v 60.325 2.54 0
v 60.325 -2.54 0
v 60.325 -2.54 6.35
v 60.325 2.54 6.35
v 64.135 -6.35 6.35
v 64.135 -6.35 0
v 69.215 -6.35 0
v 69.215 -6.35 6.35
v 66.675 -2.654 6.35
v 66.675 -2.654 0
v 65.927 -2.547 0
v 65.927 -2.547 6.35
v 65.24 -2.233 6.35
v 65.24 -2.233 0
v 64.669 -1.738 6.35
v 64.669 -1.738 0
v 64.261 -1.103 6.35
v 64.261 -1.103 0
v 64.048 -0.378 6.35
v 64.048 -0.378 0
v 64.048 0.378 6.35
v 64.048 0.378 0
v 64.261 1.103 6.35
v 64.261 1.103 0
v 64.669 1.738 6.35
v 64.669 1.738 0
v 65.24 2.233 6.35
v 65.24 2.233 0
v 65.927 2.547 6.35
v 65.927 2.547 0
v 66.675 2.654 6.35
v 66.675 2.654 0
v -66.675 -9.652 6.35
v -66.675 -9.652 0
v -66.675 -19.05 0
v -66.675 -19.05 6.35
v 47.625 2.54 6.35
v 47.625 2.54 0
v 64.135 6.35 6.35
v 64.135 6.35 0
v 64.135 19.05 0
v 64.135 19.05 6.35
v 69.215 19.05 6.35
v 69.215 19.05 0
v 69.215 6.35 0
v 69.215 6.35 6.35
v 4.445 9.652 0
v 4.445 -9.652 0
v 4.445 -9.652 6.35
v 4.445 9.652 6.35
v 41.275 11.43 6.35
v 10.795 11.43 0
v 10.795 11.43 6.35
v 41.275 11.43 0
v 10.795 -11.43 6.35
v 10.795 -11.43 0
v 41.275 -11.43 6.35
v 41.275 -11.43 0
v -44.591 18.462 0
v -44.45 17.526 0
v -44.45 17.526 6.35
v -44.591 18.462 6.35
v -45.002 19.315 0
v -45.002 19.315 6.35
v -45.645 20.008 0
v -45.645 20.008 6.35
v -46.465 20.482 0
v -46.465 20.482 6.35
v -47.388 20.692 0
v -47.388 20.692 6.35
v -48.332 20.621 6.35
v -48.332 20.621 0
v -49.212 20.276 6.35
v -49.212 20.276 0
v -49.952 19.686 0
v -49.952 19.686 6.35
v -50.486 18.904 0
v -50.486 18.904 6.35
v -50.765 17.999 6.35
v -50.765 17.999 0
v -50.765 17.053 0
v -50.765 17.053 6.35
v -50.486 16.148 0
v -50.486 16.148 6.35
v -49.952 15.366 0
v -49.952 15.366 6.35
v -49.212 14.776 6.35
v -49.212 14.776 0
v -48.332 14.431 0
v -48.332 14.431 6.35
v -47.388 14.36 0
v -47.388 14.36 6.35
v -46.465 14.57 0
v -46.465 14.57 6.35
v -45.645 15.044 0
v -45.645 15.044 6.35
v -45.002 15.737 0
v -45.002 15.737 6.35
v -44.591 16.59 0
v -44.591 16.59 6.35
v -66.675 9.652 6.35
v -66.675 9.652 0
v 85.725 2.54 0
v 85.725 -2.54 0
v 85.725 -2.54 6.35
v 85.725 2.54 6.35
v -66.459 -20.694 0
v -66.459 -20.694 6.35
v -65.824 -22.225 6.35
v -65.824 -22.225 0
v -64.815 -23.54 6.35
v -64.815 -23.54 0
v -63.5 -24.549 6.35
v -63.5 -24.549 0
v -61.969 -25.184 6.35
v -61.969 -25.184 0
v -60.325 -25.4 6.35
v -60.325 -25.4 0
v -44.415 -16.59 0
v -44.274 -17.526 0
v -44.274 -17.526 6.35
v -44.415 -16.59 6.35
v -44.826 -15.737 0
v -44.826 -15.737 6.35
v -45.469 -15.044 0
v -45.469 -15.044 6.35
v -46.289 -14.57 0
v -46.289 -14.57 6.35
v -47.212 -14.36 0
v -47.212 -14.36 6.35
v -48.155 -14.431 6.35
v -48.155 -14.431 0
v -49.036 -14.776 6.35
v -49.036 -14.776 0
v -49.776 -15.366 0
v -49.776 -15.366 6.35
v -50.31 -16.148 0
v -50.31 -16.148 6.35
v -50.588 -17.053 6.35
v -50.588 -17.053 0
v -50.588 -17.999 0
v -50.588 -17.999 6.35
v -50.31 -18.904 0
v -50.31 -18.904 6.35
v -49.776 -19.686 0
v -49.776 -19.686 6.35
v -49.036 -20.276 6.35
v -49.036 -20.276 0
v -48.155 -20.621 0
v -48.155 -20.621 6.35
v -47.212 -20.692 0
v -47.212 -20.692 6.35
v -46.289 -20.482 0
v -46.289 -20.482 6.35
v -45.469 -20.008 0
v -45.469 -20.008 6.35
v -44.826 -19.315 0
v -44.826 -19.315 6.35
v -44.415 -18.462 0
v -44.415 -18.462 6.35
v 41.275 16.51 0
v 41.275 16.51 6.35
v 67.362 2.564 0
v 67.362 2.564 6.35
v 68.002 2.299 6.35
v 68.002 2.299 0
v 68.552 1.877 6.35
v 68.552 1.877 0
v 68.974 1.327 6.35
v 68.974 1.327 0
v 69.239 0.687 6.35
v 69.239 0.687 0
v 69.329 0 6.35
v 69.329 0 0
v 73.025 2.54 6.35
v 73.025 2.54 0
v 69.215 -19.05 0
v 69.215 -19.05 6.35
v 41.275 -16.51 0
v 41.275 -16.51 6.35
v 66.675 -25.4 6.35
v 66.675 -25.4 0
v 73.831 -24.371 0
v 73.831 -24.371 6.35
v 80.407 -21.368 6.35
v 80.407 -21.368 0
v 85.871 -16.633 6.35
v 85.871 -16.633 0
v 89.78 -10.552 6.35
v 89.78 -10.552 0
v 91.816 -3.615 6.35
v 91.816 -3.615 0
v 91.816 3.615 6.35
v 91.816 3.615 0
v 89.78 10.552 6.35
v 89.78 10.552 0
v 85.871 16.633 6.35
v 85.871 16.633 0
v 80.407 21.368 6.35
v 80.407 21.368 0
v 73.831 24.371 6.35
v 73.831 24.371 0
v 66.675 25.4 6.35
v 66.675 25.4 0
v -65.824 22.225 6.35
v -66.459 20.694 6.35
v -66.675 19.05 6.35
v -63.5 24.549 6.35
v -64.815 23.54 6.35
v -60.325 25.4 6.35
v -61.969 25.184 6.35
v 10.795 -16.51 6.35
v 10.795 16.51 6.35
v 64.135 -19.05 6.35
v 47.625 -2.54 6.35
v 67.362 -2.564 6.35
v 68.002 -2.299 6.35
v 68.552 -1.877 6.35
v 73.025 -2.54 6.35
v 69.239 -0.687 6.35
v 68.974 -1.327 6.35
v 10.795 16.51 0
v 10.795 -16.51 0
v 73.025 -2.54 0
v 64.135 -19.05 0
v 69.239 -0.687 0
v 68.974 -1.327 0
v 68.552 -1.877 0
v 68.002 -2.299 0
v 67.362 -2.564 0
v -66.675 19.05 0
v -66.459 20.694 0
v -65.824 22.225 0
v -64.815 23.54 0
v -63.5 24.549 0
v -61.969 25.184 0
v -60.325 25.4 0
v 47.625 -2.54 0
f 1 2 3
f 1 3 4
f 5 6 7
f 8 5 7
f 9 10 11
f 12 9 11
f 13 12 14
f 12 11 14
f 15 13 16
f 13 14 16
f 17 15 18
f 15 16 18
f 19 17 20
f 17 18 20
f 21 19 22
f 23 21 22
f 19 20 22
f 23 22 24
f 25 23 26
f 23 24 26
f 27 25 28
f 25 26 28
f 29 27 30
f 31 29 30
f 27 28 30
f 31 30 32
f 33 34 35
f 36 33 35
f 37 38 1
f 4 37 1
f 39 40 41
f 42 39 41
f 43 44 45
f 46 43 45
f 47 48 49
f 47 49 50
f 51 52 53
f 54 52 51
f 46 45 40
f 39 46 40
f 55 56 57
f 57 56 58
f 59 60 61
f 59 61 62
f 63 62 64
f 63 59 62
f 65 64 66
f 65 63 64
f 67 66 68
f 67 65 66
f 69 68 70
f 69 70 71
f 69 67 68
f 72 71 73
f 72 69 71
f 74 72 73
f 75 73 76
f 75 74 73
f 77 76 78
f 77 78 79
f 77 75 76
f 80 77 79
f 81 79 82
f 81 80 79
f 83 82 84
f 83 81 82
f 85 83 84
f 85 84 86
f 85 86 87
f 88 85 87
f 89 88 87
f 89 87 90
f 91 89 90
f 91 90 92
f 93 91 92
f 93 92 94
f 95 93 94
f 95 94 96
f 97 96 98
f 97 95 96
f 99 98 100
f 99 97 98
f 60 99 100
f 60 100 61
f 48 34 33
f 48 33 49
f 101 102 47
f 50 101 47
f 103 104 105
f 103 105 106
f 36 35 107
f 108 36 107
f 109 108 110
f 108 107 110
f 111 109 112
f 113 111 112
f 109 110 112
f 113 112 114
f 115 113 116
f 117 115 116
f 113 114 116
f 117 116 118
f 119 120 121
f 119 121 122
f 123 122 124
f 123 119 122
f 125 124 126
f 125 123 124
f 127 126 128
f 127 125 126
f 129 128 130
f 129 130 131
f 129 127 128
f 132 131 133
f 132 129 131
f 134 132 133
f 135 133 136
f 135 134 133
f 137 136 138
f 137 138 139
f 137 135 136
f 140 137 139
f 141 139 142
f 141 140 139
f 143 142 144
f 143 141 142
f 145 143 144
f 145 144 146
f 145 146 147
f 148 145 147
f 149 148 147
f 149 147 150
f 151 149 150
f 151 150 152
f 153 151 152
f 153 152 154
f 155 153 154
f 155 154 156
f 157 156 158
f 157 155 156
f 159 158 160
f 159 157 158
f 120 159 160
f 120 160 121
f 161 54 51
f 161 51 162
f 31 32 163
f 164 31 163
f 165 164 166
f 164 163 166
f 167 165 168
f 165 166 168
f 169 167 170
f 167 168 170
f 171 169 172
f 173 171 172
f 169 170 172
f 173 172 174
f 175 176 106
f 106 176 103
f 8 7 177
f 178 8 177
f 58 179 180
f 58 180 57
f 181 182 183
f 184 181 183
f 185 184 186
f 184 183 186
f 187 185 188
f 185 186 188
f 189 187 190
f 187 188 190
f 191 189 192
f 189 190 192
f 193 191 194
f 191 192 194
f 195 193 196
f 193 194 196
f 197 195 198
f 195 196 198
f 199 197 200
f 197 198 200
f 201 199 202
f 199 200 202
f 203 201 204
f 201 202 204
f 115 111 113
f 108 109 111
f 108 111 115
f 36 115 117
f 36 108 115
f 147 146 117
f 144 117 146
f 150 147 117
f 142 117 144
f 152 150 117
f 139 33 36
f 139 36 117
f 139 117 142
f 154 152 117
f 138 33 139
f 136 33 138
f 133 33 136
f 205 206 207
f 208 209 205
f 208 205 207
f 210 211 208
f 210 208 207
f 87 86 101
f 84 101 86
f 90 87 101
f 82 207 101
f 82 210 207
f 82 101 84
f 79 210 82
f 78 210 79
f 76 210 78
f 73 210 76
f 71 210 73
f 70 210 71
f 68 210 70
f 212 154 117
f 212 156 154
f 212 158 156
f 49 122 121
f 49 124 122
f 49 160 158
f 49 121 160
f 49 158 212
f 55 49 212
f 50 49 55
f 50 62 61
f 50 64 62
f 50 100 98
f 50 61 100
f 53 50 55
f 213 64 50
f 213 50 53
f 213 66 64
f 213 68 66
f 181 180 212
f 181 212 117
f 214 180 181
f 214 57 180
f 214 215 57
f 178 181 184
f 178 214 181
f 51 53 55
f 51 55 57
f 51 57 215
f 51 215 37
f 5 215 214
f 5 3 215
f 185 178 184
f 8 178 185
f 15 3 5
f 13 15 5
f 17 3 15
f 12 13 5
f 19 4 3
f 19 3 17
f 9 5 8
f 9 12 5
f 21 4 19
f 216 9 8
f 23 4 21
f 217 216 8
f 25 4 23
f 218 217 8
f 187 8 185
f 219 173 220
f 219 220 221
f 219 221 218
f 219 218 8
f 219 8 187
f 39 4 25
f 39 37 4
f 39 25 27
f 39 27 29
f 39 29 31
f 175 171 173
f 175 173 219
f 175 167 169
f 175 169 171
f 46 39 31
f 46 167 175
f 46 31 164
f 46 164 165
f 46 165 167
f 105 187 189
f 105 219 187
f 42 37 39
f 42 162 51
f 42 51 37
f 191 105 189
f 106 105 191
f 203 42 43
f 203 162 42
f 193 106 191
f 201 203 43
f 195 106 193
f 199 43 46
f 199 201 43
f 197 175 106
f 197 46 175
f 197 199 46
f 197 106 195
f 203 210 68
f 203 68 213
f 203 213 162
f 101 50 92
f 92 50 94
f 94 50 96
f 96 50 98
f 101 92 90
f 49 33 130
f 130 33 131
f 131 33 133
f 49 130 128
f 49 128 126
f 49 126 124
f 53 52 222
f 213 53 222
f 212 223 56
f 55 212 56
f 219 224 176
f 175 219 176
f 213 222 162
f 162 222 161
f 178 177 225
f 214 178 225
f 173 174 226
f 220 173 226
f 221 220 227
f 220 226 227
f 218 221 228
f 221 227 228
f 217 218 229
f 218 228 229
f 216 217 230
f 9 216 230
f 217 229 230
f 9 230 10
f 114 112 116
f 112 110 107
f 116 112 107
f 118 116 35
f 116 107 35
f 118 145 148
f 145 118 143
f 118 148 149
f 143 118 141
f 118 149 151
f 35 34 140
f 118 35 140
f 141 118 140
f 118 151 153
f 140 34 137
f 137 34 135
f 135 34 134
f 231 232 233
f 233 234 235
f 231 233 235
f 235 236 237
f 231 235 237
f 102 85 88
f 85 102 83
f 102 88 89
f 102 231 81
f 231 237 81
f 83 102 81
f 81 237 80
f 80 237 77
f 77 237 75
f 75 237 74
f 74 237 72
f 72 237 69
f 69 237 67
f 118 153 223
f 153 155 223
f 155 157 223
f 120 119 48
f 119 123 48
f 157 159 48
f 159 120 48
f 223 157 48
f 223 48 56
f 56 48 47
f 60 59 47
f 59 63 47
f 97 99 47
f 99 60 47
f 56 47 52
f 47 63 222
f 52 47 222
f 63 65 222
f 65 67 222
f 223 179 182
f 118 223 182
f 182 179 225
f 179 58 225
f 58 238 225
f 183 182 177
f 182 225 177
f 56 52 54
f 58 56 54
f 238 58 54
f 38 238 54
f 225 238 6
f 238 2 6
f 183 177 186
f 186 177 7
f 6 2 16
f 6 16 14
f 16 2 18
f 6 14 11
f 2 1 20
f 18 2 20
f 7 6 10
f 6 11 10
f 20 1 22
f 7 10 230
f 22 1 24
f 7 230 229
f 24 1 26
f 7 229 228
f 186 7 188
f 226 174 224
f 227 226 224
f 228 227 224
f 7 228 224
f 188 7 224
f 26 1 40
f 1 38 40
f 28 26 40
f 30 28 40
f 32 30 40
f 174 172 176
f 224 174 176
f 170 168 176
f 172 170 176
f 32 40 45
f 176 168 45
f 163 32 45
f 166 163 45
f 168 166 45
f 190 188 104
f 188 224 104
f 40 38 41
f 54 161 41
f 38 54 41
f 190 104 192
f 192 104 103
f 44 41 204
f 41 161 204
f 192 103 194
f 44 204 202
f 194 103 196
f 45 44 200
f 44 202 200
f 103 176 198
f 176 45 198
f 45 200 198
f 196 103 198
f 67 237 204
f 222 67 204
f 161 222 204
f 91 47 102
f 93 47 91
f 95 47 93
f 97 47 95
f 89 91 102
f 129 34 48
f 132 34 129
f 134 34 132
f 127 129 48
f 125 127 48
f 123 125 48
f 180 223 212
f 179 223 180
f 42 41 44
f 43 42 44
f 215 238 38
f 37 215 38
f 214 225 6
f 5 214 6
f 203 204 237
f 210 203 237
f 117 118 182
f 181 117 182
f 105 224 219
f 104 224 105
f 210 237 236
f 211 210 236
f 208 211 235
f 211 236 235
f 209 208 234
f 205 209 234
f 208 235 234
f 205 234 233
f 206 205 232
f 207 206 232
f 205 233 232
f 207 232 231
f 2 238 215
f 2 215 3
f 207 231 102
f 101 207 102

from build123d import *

# Parameters (mm, degrees)
F0_R        = 3.175
F0_W        = 30.48
F0_H        = 5.08
F0_W_2      = 12.7
F0_W_3      = 71.12
F0_H_2      = 19.304
F1_DEPTH    = 6.35
F1_FACE_W   = 5.08
F1_FACE_H   = 12.7
F1_FACE_R   = 2.6543
F1_FACE_R_2 = 3.175
F1_FACE_W_2 = 30.48
F1_FACE_H_2 = 5.08
F1_FACE_W_3 = 12.7
F2_DEPTH    = 6.35
F3_DEPTH    = 93.98


with BuildPart() as f1:
    # F0 (on Top) → F1 (new body)
    with BuildSketch(Plane.XY):
        with BuildLine():
            Line((66.675, 19.05), (66.675, 25.4))
            Line((66.675, 25.4), (-60.325, 25.4))
            ThreePointArc((-60.325, 25.4), (-64.815128, 23.540128), (-66.675, 19.05))
            Line((-66.675, 19.05), (-66.675, 9.652))
            Line((-66.675, 9.652), (4.445, 9.652))
            Line((4.445, 9.652), (4.445, -9.652))
            Line((4.445, -9.652), (-66.675, -9.652))
            Line((-66.675, -9.652), (-66.675, -19.05))
            ThreePointArc((-66.675, -19.05), (-64.815128, -23.540128), (-60.325, -25.4))
            Line((-60.325, -25.4), (66.675, -25.4))
            Line((66.675, -25.4), (66.675, -19.05))
            Line((66.675, -19.05), (64.135, -19.05))
            Line((64.135, -19.05), (64.135, -6.35))
            Line((64.135, -6.35), (66.675, -6.35))
            Line((66.675, -6.35), (66.675, -2.6543))
            ThreePointArc((66.675, -2.6543), (64.0207, 0), (66.675, 2.6543))
            Line((66.675, 2.6543), (66.675, 6.35))
            Line((66.675, 6.35), (64.135, 6.35))
            Line((64.135, 6.35), (64.135, 19.05))
            Line((64.135, 19.05), (66.675, 19.05))
        make_face()
        with Locations((-47.448933, -17.526)):
            Circle(F0_R, mode=Mode.SUBTRACT)
        with Locations((26.035, -13.97)):
            Rectangle(F0_W, F0_H, mode=Mode.SUBTRACT)
        with Locations((53.975, 0)):
            Rectangle(F0_W_2, F0_H, mode=Mode.SUBTRACT)
        with Locations((-47.625, 17.526)):
            Circle(F0_R, mode=Mode.SUBTRACT)
        with Locations((26.035, 13.97)):
            Rectangle(F0_W, F0_H, mode=Mode.SUBTRACT)
        with BuildLine():
            ThreePointArc((66.675, -25.4), (92.075, 0), (66.675, 25.4))
            Line((66.675, 25.4), (66.675, 19.05))
            Line((66.675, 19.05), (69.215, 19.05))
            Line((69.215, 19.05), (69.215, 6.35))
            Line((69.215, 6.35), (66.675, 6.35))
            Line((66.675, 6.35), (66.675, 2.6543))
            ThreePointArc((66.675, 2.6543), (68.551874, 1.876874), (69.3293, 0))
            ThreePointArc((69.3293, 0), (68.551874, -1.876874), (66.675, -2.6543))
            Line((66.675, -2.6543), (66.675, -6.35))
            Line((66.675, -6.35), (69.215, -6.35))
            Line((69.215, -6.35), (69.215, -19.05))
            Line((69.215, -19.05), (66.675, -19.05))
            Line((66.675, -19.05), (66.675, -25.4))
        make_face()
        with Locations((79.375, 0)):
            Rectangle(F0_W_2, F0_H, mode=Mode.SUBTRACT)
        with Locations((-31.115, 0)):
            Rectangle(F0_W_3, F0_H_2)
    extrude(amount=F1_DEPTH)

    # F1_face (on face) → F2 (join)
    with BuildSketch(Plane(origin=(7.852921, 0, 6.35), x_dir=(1, 0, 0), z_dir=(0, 0, 1))):
        with BuildLine():
            Line((58.822079, 25.4), (-68.177921, 25.4))
            ThreePointArc((-68.177921, 25.4), (-72.668049, 23.540128), (-74.527921, 19.05))
            Line((-74.527921, 19.05), (-74.527921, -19.05))
            ThreePointArc((-74.527921, -19.05), (-72.668049, -23.540128), (-68.177921, -25.4))
            Line((-68.177921, -25.4), (58.822079, -25.4))
            ThreePointArc((58.822079, -25.4), (84.222079, 0), (58.822079, 25.4))
        make_face()
        with Locations((58.822079, 12.7)):
            Rectangle(F1_FACE_W, F1_FACE_H, mode=Mode.SUBTRACT)
        with Locations((58.822079, -12.7)):
            Rectangle(F1_FACE_W, F1_FACE_H, mode=Mode.SUBTRACT)
        with Locations((58.822079, 0)):
            Circle(F1_FACE_R, mode=Mode.SUBTRACT)
        with Locations((-55.301854, -17.526)):
            Circle(F1_FACE_R_2, mode=Mode.SUBTRACT)
        with Locations((18.182079, -13.97)):
            Rectangle(F1_FACE_W_2, F1_FACE_H_2, mode=Mode.SUBTRACT)
        with Locations((46.122079, 0)):
            Rectangle(F1_FACE_W_3, F1_FACE_H_2, mode=Mode.SUBTRACT)
        with Locations((-55.477921, 17.526)):
            Circle(F1_FACE_R_2, mode=Mode.SUBTRACT)
        with Locations((18.182079, 13.97)):
            Rectangle(F1_FACE_W_2, F1_FACE_H_2, mode=Mode.SUBTRACT)
        with Locations((71.522079, 0)):
            Rectangle(F1_FACE_W_3, F1_FACE_H_2, mode=Mode.SUBTRACT)
    extrude(amount=-F2_DEPTH)

    # F0 (on Top) → F3 (cut)
    with BuildSketch(Plane.XY):
        with Locations((-31.115, 0)):
            Rectangle(F0_W_3, F0_H_2)
    extrude(amount=F3_DEPTH, mode=Mode.SUBTRACT)


solid = f1.part
